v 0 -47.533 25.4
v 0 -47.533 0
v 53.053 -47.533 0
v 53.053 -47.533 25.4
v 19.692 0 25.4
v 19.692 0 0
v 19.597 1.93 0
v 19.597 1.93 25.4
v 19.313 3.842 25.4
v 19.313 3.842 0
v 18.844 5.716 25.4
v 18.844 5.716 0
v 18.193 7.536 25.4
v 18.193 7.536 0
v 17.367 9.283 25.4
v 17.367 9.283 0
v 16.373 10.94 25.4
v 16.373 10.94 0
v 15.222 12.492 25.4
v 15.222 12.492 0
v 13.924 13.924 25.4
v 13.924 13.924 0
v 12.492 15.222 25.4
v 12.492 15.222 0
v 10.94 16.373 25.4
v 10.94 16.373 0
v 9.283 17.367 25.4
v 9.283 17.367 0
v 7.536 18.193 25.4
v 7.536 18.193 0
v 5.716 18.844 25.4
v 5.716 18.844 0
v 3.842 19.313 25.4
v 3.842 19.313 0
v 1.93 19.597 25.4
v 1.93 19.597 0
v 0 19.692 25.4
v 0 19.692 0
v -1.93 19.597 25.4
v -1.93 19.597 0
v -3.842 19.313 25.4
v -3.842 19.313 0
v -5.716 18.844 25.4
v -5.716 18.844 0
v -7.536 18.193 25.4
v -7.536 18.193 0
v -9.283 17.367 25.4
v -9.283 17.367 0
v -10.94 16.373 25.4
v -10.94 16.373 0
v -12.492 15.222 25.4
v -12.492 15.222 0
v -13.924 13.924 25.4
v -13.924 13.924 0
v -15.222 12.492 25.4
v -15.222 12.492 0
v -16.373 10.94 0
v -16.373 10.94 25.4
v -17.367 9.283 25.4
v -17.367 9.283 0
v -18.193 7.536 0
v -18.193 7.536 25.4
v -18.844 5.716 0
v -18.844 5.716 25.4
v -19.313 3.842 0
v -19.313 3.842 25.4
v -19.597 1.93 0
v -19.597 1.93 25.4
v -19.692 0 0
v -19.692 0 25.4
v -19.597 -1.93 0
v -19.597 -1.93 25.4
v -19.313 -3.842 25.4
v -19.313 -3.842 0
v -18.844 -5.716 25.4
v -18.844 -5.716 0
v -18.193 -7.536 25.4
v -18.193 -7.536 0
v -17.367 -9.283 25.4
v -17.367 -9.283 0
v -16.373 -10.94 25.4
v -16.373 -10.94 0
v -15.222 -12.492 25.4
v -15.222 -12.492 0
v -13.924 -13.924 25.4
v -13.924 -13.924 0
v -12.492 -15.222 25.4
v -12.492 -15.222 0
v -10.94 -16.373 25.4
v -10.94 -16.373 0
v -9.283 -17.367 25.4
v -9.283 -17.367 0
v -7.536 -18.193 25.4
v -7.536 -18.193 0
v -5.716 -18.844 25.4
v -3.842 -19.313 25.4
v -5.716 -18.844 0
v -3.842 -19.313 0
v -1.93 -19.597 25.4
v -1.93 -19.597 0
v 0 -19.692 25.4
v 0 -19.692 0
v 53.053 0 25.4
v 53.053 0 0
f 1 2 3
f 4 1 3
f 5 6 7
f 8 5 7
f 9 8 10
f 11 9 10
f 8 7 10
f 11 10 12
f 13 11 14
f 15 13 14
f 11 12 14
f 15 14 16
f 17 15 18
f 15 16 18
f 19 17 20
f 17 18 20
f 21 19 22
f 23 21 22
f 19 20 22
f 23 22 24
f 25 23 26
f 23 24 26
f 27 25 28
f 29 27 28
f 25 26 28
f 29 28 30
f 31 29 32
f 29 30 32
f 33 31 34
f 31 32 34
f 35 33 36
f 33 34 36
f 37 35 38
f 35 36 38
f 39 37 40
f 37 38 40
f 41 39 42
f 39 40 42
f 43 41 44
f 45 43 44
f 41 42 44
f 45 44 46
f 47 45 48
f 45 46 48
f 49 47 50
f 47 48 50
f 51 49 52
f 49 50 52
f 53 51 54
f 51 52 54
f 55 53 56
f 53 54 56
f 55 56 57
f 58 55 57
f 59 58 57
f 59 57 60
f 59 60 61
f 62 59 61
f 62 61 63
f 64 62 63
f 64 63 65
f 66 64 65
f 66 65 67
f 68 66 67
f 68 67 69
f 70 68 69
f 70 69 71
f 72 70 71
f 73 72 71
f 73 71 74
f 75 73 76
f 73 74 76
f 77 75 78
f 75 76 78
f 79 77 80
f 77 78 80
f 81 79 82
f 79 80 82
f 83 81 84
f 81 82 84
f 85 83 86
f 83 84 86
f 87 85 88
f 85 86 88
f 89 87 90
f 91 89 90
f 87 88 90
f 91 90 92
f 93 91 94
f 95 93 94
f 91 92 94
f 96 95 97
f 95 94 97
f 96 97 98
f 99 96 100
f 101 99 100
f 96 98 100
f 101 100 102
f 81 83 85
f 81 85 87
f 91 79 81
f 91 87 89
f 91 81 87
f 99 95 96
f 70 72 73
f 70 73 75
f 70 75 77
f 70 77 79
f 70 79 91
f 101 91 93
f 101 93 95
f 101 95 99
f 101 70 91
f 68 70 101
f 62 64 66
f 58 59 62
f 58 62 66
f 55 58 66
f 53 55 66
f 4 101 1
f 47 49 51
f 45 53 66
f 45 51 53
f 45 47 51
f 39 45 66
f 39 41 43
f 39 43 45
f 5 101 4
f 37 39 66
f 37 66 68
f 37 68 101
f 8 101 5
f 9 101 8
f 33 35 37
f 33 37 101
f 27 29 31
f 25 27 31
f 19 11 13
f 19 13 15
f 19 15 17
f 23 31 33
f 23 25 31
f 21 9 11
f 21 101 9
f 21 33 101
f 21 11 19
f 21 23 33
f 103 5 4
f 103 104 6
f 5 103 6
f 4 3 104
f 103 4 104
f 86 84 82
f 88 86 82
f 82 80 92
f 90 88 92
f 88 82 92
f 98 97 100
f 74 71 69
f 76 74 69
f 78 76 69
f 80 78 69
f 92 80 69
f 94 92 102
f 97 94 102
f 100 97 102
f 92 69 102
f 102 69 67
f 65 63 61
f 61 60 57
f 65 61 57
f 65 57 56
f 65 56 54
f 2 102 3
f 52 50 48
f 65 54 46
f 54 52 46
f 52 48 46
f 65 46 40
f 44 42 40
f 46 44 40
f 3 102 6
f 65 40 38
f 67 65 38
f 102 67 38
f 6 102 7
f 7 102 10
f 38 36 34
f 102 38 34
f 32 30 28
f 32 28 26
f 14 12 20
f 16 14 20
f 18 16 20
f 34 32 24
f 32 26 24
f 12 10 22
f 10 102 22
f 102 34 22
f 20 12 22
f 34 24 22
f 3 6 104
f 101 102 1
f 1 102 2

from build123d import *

# Parameters (mm, degrees)
F1_DEPTH = 25.4


with BuildPart() as f1:
    # F0 (on Top) → F1 (new body)
    with BuildSketch(Plane.XY):
        with BuildLine():
            Line((0, -19.6916791789), (0, 0))
            Line((0, 0), (19.6916791789, 0))
            ThreePointArc((19.6916791789, 0), (-13.9241198804, 13.9241198804), (0, -19.6916791789))
        make_face()
        with BuildLine():
            Line((19.6916791789, 0), (0, 0))
            Line((0, 0), (0, -19.6916791789))
            ThreePointArc((0, -19.6916791789), (13.9241198804, -13.9241198804), (19.6916791789, 0))
        make_face()
        with BuildLine():
            Line((53.0525743961, 0), (19.6916791789, 0))
            ThreePointArc((19.6916791789, 0), (13.9241198804, -13.9241198804), (0, -19.6916791789))
            Line((0, -19.6916791789), (0, -47.5333593786))
            Line((0, -47.5333593786), (53.0525743961, -47.5333593786))
            Line((53.0525743961, -47.5333593786), (53.0525743961, 0))
        make_face()
    extrude(amount=F1_DEPTH)


solid = f1.part
